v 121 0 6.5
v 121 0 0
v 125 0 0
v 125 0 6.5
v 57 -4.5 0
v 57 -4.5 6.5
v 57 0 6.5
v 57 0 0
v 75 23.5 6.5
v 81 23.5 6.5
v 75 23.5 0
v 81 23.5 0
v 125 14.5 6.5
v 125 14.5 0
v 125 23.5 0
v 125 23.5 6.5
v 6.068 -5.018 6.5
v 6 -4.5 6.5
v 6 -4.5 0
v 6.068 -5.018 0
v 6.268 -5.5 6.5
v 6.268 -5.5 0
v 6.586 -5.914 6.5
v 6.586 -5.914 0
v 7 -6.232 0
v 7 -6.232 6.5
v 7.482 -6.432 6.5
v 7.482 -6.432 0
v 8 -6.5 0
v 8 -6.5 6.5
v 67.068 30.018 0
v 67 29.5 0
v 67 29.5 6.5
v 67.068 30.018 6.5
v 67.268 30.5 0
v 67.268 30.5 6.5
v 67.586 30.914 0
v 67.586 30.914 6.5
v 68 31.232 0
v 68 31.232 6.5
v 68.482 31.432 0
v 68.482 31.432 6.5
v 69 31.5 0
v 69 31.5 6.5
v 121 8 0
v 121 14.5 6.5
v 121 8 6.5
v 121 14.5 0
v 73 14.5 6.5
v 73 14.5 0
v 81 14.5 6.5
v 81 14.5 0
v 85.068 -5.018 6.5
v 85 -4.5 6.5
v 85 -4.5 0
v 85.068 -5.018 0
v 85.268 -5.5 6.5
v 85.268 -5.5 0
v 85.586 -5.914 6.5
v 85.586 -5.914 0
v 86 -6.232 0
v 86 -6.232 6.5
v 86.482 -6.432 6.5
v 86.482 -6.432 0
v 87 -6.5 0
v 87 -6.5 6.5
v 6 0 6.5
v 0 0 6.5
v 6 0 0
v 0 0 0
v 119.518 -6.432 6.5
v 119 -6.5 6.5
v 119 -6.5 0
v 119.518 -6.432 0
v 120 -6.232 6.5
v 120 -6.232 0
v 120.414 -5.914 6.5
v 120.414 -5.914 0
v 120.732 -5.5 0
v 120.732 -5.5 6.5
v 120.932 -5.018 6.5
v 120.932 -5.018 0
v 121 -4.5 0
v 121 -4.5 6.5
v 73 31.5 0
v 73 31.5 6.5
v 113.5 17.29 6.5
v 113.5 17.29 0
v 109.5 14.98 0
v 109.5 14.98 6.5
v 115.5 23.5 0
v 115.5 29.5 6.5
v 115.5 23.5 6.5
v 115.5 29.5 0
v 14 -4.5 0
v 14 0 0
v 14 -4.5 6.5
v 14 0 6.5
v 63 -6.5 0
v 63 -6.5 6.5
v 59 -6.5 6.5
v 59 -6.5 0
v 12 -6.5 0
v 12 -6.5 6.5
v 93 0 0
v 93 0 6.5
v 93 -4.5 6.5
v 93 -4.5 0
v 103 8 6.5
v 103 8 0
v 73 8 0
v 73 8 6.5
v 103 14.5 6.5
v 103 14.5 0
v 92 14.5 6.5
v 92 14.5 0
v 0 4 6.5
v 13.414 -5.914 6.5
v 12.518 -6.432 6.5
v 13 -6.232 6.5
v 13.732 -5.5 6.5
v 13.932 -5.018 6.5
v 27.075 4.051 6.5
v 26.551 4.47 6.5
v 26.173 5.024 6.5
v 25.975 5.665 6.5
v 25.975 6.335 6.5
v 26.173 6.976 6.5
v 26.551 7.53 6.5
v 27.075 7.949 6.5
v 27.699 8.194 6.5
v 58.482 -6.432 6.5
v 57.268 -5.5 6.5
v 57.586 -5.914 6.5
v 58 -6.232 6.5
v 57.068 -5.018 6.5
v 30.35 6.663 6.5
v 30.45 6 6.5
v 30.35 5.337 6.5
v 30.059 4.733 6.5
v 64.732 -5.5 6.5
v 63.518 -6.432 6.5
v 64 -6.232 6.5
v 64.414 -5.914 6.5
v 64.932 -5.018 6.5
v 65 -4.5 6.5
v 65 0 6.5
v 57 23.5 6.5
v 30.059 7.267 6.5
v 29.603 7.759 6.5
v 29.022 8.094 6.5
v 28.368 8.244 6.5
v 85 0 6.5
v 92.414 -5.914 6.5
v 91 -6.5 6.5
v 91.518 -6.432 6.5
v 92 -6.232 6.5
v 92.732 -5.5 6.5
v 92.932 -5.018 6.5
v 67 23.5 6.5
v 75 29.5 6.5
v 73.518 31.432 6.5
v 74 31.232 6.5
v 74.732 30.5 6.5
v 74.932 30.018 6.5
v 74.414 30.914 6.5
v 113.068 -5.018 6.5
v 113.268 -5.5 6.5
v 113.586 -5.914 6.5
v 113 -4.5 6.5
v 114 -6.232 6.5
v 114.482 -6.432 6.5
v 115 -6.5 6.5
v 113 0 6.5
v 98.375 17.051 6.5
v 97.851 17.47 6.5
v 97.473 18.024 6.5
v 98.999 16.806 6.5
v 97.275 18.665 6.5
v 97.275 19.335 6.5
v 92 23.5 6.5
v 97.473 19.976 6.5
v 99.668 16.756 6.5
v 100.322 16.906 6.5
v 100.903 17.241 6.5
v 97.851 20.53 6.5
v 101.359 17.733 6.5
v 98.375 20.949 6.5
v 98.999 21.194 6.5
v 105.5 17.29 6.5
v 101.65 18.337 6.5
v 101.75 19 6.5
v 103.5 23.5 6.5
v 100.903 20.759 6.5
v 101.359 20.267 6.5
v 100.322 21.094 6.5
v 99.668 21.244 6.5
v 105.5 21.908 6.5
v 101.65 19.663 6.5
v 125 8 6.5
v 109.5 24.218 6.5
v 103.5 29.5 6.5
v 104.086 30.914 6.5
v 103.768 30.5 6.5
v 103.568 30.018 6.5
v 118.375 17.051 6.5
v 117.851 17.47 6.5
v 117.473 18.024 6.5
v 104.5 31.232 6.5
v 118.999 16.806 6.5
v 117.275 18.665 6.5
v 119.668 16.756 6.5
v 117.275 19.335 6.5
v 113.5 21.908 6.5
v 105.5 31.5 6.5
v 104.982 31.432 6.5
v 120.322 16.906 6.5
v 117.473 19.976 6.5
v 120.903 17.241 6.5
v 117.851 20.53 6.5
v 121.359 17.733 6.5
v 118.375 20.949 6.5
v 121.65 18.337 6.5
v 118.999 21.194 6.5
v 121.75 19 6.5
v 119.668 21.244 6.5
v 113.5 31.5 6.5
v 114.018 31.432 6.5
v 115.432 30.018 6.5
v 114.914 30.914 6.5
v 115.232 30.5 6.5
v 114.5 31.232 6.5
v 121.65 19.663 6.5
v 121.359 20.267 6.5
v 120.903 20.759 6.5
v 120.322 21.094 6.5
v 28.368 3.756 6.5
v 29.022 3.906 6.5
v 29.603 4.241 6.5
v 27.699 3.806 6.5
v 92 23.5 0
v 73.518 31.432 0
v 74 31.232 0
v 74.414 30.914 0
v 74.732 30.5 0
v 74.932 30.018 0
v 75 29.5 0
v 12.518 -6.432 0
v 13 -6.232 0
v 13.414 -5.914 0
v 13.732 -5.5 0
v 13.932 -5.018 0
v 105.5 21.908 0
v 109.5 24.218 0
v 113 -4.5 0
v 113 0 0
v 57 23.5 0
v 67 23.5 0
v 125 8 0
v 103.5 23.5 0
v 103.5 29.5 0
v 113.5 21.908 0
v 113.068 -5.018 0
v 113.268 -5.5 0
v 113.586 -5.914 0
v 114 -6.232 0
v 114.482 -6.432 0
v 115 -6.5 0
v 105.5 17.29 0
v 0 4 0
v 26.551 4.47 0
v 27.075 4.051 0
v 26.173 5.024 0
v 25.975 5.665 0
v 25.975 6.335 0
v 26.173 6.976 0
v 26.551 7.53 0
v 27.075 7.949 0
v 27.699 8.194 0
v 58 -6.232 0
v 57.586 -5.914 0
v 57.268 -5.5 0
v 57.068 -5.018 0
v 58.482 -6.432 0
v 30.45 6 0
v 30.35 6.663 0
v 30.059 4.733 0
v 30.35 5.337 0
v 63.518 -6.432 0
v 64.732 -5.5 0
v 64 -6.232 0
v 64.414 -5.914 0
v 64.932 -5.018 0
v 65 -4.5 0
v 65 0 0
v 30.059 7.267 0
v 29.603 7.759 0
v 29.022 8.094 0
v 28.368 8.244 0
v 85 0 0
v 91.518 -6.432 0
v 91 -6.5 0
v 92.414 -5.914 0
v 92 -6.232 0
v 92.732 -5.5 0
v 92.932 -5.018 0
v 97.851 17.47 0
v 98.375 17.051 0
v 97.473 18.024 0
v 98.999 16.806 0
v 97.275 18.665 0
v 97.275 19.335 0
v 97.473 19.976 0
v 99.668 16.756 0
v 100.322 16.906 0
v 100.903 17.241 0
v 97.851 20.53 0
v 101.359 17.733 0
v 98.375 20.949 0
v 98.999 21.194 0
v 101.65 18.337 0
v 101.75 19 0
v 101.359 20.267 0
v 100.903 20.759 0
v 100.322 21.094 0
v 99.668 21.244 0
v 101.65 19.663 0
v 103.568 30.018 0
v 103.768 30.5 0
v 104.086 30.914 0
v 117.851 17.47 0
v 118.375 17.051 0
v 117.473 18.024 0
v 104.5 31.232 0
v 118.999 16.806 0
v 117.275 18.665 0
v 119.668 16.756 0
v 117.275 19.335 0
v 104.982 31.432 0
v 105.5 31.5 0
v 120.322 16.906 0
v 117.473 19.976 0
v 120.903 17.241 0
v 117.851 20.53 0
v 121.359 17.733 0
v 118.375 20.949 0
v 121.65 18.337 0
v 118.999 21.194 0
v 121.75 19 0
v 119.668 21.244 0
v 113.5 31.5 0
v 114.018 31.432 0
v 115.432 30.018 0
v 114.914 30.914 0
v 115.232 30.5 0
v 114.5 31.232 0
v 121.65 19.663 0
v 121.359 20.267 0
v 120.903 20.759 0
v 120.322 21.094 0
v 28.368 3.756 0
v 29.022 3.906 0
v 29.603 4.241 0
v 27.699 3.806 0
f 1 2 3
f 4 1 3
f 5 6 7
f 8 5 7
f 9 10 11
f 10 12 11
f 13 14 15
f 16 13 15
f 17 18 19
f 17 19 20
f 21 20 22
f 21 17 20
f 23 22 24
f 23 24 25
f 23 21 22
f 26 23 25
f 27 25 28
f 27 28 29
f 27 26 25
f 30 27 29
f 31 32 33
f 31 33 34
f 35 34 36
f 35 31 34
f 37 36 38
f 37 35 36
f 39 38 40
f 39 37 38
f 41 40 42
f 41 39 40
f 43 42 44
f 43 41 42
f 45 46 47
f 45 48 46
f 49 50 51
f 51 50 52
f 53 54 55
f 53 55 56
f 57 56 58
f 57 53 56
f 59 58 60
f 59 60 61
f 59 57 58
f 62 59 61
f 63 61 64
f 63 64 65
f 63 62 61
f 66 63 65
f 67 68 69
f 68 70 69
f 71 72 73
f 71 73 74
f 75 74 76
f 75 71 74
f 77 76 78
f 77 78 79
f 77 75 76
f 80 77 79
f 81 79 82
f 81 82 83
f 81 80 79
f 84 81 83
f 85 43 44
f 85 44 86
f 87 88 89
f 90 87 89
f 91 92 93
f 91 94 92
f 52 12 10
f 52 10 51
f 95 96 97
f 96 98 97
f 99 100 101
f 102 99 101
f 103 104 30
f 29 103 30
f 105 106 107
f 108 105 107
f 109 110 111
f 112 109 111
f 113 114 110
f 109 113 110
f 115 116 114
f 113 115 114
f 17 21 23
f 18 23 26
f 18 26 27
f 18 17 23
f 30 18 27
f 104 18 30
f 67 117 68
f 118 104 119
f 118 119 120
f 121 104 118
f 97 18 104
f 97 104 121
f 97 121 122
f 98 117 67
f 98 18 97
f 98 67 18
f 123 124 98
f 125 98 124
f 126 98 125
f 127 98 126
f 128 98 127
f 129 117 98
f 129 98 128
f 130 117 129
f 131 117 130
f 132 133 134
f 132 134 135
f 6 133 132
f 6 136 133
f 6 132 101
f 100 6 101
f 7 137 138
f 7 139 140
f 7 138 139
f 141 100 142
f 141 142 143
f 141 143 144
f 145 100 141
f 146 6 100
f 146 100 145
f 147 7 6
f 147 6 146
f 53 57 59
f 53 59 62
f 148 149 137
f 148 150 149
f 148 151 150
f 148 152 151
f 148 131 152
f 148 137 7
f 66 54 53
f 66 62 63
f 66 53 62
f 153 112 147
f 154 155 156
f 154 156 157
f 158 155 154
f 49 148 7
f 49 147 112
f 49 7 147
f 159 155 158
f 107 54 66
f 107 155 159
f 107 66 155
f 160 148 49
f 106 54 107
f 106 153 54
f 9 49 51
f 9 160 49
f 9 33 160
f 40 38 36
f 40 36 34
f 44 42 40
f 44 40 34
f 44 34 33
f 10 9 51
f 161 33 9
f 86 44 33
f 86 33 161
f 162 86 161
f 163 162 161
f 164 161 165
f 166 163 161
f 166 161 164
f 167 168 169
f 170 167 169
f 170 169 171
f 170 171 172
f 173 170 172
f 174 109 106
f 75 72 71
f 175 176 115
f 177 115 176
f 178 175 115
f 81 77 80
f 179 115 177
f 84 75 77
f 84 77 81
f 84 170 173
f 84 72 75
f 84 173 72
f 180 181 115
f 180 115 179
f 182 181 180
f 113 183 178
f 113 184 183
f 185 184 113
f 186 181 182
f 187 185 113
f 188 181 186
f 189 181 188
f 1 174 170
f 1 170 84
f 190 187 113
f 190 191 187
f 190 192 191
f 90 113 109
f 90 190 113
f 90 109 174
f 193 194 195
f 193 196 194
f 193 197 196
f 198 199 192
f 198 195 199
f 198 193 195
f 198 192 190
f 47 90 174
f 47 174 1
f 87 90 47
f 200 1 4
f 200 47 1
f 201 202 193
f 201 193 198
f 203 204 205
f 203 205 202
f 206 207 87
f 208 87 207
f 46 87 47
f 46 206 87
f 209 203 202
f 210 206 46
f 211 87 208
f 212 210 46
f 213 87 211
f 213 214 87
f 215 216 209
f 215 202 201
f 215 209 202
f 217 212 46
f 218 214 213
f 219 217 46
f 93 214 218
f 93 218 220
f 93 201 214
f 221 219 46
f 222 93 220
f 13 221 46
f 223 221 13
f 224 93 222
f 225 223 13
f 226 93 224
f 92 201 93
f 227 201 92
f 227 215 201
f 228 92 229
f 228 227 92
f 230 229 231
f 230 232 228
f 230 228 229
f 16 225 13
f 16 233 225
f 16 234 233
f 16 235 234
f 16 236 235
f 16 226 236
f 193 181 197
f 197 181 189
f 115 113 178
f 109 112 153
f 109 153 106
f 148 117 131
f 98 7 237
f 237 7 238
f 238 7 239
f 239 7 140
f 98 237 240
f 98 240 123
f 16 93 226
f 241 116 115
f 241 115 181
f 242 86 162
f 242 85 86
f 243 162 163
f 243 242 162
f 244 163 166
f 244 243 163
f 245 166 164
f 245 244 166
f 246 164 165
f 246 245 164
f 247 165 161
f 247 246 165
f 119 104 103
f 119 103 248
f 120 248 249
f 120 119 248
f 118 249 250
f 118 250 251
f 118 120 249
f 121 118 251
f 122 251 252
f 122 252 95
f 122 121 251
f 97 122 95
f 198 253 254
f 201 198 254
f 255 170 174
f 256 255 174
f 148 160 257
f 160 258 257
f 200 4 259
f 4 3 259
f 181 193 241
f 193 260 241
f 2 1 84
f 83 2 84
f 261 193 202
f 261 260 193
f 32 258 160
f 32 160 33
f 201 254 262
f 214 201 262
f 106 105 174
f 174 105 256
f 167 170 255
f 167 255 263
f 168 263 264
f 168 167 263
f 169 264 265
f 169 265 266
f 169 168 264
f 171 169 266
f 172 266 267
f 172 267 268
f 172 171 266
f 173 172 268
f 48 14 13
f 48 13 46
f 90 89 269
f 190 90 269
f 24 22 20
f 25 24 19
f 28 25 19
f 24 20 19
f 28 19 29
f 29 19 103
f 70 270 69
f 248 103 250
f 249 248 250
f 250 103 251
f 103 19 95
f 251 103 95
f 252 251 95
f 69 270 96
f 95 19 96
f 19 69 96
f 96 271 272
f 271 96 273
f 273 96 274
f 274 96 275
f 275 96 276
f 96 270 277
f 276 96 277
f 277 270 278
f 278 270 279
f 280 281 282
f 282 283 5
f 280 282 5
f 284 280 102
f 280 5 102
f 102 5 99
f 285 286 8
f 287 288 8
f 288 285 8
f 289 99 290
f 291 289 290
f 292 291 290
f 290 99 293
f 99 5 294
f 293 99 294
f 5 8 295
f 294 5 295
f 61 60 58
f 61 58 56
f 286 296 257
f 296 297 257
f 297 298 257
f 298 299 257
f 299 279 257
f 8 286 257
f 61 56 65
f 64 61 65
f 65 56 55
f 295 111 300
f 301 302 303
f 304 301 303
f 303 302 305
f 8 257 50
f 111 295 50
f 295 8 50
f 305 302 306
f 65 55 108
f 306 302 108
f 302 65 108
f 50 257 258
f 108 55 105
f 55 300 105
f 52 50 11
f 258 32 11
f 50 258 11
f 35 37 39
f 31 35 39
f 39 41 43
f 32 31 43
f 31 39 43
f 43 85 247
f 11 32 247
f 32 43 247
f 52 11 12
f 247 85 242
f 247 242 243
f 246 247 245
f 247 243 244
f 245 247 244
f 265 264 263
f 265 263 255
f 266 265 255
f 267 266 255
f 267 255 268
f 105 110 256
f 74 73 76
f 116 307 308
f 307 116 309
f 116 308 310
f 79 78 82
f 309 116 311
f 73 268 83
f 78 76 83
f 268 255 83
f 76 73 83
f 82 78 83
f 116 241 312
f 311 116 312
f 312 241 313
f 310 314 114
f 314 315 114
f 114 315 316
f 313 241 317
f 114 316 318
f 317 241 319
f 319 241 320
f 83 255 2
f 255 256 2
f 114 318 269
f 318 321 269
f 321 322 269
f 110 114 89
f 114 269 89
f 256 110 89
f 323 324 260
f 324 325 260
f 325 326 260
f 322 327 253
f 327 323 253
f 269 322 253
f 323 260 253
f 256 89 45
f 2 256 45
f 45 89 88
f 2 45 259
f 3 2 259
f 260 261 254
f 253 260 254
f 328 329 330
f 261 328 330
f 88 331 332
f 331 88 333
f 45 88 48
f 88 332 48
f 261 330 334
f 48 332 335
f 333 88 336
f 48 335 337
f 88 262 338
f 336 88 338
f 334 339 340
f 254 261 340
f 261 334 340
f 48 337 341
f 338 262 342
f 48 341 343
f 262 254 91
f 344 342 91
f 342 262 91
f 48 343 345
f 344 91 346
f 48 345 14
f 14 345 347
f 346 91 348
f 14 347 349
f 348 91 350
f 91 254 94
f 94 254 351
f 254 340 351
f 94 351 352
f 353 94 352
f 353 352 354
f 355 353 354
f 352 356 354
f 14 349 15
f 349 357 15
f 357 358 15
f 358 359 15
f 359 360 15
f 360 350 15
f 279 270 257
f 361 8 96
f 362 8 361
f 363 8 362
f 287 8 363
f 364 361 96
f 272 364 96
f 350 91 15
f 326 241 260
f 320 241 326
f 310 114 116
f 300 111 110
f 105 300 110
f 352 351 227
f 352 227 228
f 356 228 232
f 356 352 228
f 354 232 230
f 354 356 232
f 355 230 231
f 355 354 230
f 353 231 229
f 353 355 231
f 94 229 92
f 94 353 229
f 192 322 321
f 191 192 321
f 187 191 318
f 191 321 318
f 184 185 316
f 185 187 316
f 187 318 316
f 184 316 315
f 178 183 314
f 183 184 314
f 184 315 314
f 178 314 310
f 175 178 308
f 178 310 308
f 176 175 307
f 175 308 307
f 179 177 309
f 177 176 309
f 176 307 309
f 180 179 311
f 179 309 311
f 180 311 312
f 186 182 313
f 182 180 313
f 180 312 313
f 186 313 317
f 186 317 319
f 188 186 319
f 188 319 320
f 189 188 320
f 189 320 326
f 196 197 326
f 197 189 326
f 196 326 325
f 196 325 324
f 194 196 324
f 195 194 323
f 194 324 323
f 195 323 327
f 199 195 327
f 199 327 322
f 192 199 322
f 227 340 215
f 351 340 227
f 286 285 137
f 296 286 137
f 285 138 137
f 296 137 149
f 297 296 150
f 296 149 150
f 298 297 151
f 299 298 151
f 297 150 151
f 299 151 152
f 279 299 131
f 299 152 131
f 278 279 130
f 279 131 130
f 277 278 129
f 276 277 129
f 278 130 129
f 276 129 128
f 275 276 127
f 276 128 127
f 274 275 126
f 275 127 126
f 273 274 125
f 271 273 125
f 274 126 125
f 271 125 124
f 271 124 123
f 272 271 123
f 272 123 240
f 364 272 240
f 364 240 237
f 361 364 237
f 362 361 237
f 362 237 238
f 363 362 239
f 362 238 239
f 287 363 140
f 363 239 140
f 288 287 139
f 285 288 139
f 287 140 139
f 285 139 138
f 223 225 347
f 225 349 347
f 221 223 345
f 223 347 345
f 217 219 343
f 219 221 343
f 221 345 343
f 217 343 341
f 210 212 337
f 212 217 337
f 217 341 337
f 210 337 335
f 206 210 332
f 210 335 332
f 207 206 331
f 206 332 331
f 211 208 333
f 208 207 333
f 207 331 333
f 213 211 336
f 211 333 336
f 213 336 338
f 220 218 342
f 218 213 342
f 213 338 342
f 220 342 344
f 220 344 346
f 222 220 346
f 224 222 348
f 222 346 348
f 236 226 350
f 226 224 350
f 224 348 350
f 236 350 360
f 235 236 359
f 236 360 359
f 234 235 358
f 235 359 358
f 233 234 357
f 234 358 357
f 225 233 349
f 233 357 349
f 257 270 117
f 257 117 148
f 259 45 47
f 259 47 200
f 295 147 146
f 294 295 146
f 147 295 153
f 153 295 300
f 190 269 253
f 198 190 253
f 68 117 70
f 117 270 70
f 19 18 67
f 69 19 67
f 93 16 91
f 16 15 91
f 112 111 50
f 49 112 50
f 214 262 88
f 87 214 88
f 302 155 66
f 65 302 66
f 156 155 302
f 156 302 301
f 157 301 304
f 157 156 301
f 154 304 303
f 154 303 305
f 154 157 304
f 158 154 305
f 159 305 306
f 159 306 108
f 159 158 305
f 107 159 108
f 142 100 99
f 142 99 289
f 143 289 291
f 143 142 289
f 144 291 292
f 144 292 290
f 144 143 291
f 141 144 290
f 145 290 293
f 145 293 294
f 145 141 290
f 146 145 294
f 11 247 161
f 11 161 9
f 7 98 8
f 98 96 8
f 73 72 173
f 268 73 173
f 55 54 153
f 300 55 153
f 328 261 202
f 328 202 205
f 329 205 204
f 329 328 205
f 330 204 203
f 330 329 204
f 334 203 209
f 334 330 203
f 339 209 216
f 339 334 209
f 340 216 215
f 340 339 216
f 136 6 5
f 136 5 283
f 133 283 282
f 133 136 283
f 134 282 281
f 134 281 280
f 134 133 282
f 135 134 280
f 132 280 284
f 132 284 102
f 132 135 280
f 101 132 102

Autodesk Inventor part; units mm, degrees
ref_plane "YZ Plane" through (0, 0, 0) normal (1, 0, 0) x (0, 1, 0)
ref_plane "XZ Plane" through (0, 0, 0) normal (0, 1, 0) x (-1, 0, 0)
ref_plane "XY Plane" through (0, 0, 0) normal (0, 0, 1) x (1, 0, 0)
sketch "Sketch1" plane through (0, 0, 0) normal (0, 0, 1) x (1, 0, 0)
  line L0 (0, 4) -> (0, 0)
  line L1 (0, 0) -> (125, 0)
  line L2 (0, 4) -> (57, 23.5)
  line L3 (103, 14.5) -> (103, 8)
  line L4 (103, 8) -> (73, 8)
  line L5 (73, 8) -> (73, 14.5)
  line L6 (125, 14.5) -> (121, 14.5)
  line L7 (121, 14.5) -> (121, 8)
  line L8 (121, 8) -> (125, 8)
  line L9 (125, 0) -> (125, 8)
  line L10 (125, 14.5) -> (125, 23.5)
  line L11 (81, 23.5) -> (81, 14.5)
  line L12 (92, 14.5) -> (92, 23.5)
  line L13 (73, 14.5) -> (81, 14.5)
  line L14 (92, 14.5) -> (103, 14.5)
  line L15 (81, 14.5) -> (92, 14.5) construction
  circle A0 centre (86.5, 19.599) radius 7.5 construction
  circle A1 centre (86.5, 19.599) radius 4 construction
  line L16 (113.5, 21.9084) -> (113.5, 17.2896)
  line L17 (113.5, 17.2896) -> (109.5, 14.9802)
  line L18 (109.5, 14.9802) -> (105.5, 17.2896)
  line L19 (105.5, 17.2896) -> (105.5, 21.9084)
  line L20 (105.5, 21.9084) -> (109.5, 24.2178)
  line L21 (109.5, 24.2178) -> (113.5, 21.9084)
  circle A2 centre (109.5, 19.599) radius 2.5 construction
  line L22 (103.5, 23.5) -> (103.5, 29.5)
  line L23 (105.5, 31.5) -> (113.5, 31.5)
  line L24 (115.5, 29.5) -> (115.5, 23.5)
  arc A3 (105.5, 31.5) -> (103.5, 29.5) centre (105.5, 29.5) ccw
  arc A4 (115.5, 29.5) -> (113.5, 31.5) centre (113.5, 29.5) ccw
  line L25 (125, 23.5) -> (115.5, 23.5)
  line L26 (103.5, 23.5) -> (92, 23.5)
  circle A5 centre (99.5, 19) radius 4.5 construction
  circle A6 centre (119.5, 19) radius 4.5 construction
  circle A7 centre (99.5, 19) radius 2.25
  circle A8 centre (119.5, 19) radius 2.25
  line L27 (67, 23.5) -> (67, 29.5)
  line L28 (69, 31.5) -> (73, 31.5)
  line L29 (75, 29.5) -> (75, 23.5)
  arc A9 (69, 31.5) -> (67, 29.5) centre (69, 29.5) ccw
  arc A10 (75, 29.5) -> (73, 31.5) centre (73, 29.5) ccw
  line L30 (81, 23.5) -> (75, 23.5)
  line L31 (67, 23.5) -> (57, 23.5)
  point P0 (81, 14.5)
  point P1 (92, 14.5)
  point P2 (86.5, 14.5)
  point P3 (125, 19)
  point P4 (109.5, 31.5)
  dimension "d0" = 8
  dimension "d2" = 6.5
  dimension "d3" = 4
  dimension "d4" = 15
  dimension "d5" = 8
  dimension "d6" = 9
  dimension "d7" = 11
  dimension "d8" = 11
  dimension "d9" = 8
  dimension "d10" = 5
  dimension "d11" = 2
  dimension "d12" = 12
  dimension "d13" = 9
  dimension "d14" = 9
  dimension "d15" = 10
  dimension "d16" = 10
  dimension "d17" = 4.5
  dimension "d18" = 4.5
  dimension "d19" = 13
  dimension "d20" = 5.5
  dimension "d21" = 18
  dimension "d22" = 2
  dimension "d23" = 8
  dimension "d24" = 6
  dimension "d25" = 10
  dimension "d27" = 30
  dimension "d28" = 4
  dimension "d30" = 8
  dimension "d31" = 125
extrude "Extrusion1" add sketch "Sketch1" along normal blind 6.5
sketch "Sketch2" plane through (0, 0, 6.5) normal (0, 0, 1) x (1, 0, 0)
  line L0 (0, 4) -> (0, 0) projected
  line L1 (0, 0) -> (125, 0) projected
  line L2 (6, 0) -> (14, 0)
  line L3 (14, 0) -> (14, -4.5)
  line L4 (12, -6.5) -> (8, -6.5)
  line L5 (6, -4.5) -> (6, 0)
  line L6 (57, 0) -> (65, 0)
  line L7 (65, 0) -> (65, -4.5)
  line L8 (63, -6.5) -> (59, -6.5)
  line L9 (57, -4.5) -> (57, 0)
  line L10 (85, 0) -> (93, 0)
  line L11 (93, 0) -> (93, -4.5)
  line L12 (91, -6.5) -> (87, -6.5)
  line L13 (85, -4.5) -> (85, 0)
  line L14 (113, 0) -> (121, 0)
  line L15 (121, 0) -> (121, -4.5)
  line L16 (119, -6.5) -> (115, -6.5)
  line L17 (113, -4.5) -> (113, 0)
  arc A0 (6, -4.5) -> (8, -6.5) centre (8, -4.5) ccw
  arc A1 (12, -6.5) -> (14, -4.5) centre (12, -4.5) ccw
  arc A2 (57, -4.5) -> (59, -6.5) centre (59, -4.5) ccw
  arc A3 (63, -6.5) -> (65, -4.5) centre (63, -4.5) ccw
  arc A4 (85, -4.5) -> (87, -6.5) centre (87, -4.5) ccw
  arc A5 (91, -6.5) -> (93, -4.5) centre (91, -4.5) ccw
  arc A6 (113, -4.5) -> (115, -6.5) centre (115, -4.5) ccw
  arc A7 (119, -6.5) -> (121, -4.5) centre (119, -4.5) ccw
  dimension "d34" = 2
  dimension "d35" = 8
  dimension "d36" = 8
  dimension "d37" = 8
  dimension "d38" = 8
  dimension "d39" = 6.5
  dimension "d40" = 6
  dimension "d41" = 43
  dimension "d42" = 20
  dimension "d43" = 20
extrude "Extrusion2" add sketch "Sketch2" against normal blind 6.5
sketch "Sketch3" plane through (0, 0, 6.5) normal (0, 0, 1) x (1, 0, 0)
  line L0 (0, 4) -> (0, 0) projected
  line L1 (14, 0) -> (57, 0) projected
  circle A0 centre (28.2, 6) radius 2.25
  circle A1 centre (28.2, 6) radius 4.5 construction
  dimension "d46" = 4.5
  dimension "d47" = 6
  dimension "d48" = 28.2
  dimension "d51" = 9
extrude "Extrusion3" cut sketch "Sketch3" against normal through all
properties part number "x_motor_wall_upper"
